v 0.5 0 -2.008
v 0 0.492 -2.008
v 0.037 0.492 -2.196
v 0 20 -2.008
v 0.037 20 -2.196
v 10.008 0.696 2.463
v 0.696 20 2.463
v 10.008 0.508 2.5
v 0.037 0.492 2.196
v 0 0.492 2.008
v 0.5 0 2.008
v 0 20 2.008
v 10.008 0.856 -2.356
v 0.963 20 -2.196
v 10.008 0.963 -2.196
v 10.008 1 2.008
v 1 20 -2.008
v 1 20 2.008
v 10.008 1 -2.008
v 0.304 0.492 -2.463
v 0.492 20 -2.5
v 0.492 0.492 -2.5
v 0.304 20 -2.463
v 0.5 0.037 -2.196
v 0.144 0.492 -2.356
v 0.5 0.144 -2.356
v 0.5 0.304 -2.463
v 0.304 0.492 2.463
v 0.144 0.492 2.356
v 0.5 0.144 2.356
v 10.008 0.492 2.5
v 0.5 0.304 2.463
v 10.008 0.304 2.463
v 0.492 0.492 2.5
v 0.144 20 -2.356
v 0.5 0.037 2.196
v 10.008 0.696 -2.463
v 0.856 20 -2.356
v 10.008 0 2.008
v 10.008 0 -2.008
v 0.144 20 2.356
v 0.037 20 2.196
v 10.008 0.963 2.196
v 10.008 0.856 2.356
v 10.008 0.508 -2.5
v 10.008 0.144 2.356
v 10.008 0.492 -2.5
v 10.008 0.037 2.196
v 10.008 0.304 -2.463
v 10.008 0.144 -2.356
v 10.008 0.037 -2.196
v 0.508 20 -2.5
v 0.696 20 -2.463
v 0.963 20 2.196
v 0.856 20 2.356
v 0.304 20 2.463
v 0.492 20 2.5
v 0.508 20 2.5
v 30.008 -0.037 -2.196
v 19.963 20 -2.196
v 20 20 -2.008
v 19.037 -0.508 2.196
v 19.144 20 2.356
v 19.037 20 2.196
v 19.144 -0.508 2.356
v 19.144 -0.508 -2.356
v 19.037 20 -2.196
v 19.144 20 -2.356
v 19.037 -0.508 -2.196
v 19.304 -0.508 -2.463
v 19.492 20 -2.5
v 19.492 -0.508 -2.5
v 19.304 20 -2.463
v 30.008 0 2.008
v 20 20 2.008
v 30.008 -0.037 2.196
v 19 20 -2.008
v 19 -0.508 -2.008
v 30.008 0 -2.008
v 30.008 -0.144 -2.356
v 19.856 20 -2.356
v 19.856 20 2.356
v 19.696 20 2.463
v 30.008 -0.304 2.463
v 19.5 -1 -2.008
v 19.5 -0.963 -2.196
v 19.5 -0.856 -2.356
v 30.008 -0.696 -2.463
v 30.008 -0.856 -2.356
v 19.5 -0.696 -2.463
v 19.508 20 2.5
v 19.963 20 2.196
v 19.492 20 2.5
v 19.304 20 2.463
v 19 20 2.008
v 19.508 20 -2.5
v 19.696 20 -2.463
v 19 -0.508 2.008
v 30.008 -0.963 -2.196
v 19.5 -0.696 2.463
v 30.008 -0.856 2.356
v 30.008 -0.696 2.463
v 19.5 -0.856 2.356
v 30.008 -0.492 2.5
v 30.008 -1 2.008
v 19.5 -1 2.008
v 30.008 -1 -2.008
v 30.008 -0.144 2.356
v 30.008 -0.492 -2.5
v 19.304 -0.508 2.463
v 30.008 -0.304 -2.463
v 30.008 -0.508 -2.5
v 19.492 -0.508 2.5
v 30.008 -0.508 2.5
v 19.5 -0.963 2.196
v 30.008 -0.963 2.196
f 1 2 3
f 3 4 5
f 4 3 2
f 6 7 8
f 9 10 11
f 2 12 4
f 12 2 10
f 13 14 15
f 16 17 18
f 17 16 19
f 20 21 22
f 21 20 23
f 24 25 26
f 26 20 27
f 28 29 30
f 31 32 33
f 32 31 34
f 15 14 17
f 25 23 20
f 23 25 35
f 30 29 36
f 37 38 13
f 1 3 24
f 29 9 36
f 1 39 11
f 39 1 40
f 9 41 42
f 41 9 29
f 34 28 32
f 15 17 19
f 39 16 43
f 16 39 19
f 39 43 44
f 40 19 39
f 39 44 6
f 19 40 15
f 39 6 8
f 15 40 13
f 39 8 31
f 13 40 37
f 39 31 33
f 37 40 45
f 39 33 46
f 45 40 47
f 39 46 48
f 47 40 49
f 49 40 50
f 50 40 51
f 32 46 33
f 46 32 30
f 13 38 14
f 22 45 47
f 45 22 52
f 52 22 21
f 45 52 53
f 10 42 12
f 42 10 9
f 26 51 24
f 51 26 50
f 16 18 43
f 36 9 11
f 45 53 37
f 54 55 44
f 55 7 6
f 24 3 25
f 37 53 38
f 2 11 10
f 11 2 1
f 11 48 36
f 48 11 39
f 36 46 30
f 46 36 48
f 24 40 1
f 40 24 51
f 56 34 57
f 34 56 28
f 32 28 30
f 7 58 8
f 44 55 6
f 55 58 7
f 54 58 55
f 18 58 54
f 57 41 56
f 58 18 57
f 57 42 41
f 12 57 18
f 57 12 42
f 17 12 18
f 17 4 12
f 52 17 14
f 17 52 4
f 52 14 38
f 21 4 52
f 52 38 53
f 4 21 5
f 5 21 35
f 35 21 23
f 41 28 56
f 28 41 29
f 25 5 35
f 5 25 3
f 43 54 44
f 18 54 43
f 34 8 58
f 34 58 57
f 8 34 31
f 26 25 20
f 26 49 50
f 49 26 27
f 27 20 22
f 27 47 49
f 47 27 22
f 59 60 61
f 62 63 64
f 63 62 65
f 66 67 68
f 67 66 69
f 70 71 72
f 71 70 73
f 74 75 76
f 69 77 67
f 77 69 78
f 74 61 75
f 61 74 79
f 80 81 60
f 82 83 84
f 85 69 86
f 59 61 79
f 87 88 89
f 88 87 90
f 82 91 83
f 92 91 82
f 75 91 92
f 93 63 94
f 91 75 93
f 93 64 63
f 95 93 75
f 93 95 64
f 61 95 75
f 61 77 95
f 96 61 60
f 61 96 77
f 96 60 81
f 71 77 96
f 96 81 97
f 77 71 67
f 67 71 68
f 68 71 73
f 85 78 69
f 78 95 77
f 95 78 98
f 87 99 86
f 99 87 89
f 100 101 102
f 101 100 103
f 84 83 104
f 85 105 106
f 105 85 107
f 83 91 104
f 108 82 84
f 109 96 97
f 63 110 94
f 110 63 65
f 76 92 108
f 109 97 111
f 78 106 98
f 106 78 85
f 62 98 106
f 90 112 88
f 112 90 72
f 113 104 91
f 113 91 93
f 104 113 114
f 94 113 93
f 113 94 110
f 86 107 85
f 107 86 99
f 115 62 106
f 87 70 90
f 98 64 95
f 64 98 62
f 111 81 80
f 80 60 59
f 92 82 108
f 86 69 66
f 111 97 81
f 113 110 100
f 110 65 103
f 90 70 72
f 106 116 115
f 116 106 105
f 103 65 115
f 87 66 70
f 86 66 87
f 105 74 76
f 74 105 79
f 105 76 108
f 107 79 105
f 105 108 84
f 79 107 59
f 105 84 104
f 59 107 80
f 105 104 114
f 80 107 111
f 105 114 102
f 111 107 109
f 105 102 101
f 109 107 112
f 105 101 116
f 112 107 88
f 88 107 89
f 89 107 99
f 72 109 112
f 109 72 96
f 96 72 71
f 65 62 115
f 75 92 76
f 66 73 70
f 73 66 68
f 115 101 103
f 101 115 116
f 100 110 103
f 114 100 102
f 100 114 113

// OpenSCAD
// file: ../utils/core/clip.scad
//
// NopSCADlib Copyright Chris Palmer 2018
// nop.head@gmail.com
// hydraraptor.blogspot.com
//
// This file is part of NopSCADlib.
//
// NopSCADlib is free software: you can redistribute it and/or modify it under the terms of the
// GNU General Public License as published by the Free Software Foundation, either version 3 of
// the License, or (at your option) any later version.
//
// NopSCADlib is distributed in the hope that it will be useful, but WITHOUT ANY WARRANTY;
// without even the implied warranty of MERCHANTABILITY or FITNESS FOR A PARTICULAR PURPOSE.
// See the GNU General Public License for more details.
//
// You should have received a copy of the GNU General Public License along with NopSCADlib.
// If not, see <https://www.gnu.org/licenses/>.
//

//
//! Construct arbitrarily large box to partition 3D space and clip objects, useful for creating cross sections to see the inside when debugging.
//!
//! Original version by Doug Moen on the OpenSCAD forum
//
//
module box(xmin, ymin, zmin, xmax, ymax, zmax) //! Construct a box given its bounds
    polyhedron(
        [[xmin, ymin, zmin],  // 0
         [xmin, ymin, zmax],  // 1
         [xmin, ymax, zmin],  // 2
         [xmin, ymax, zmax],  // 3
         [xmax, ymin, zmin],  // 4
         [xmax, ymin, zmax],  // 5
         [xmax, ymax, zmin],  // 6
         [xmax, ymax, zmax]], // 7
        [[7,5,1,3],  // top
         [2,0,4,6],  // bottom
         [5,4,0,1],  // front
         [3,2,6,7],  // back
         [5,7,6,4],  // right
         [0,2,3,1]]  // left
    );

module clip(xmin = -inf, ymin = -inf, zmin = -inf, xmax = inf, ymax = inf, zmax = inf) //! Clip child to specified boundaries
    render() intersection() {
        children();

        box(xmin, ymin, zmin, xmax, ymax, zmax);
    }
// file: ../utils/core/rounded_rectangle.scad
//
// NopSCADlib Copyright Chris Palmer 2018
// nop.head@gmail.com
// hydraraptor.blogspot.com
//
// This file is part of NopSCADlib.
//
// NopSCADlib is free software: you can redistribute it and/or modify it under the terms of the
// GNU General Public License as published by the Free Software Foundation, either version 3 of
// the License, or (at your option) any later version.
//
// NopSCADlib is distributed in the hope that it will be useful, but WITHOUT ANY WARRANTY;
// without even the implied warranty of MERCHANTABILITY or FITNESS FOR A PARTICULAR PURPOSE.
// See the GNU General Public License for more details.
//
// You should have received a copy of the GNU General Public License along with NopSCADlib.
// If not, see <https://www.gnu.org/licenses/>.
//

//
//! Rectangle with rounded corners.
//
module rounded_square(size, r, center = true) //! Like `square()` but with with rounded corners
{
    assert(r < min(size.x, size.y) / 2);
    $fn = r2sides4n(r);
    offset(r) offset(-r) square(size, center = center);
}

module rounded_rectangle(size, r, center = false, xy_center = true) //! Like `cube()` but corners rounded in XY plane and separate centre options for xy and z.
{
    extrude_if(size.z, center = center)
        rounded_square([size.x, size.y], r, xy_center);
}

module rounded_cube_xy(size, r = 0, xy_center = false, z_center = false) //! Like `cube()` but corners rounded in XY plane and separate centre options for xy and z.
{
    extrude_if(size.z, center = z_center)
        rounded_square([size.x, size.y], r, xy_center);
}

module rounded_cube_xz(size, r = 0, xy_center = false, z_center = false) //! Like `cube()` but corners rounded in XZ plane and separate centre options for xy and z.
{
    translate([xy_center ? 0 : size.x / 2, xy_center ? 0 : size.y / 2, z_center ? 0 : size.z / 2])
        rotate([90, 0, 0])
            rounded_cube_xy([size.x, size.z, size.y], r, xy_center = true, z_center = true);
}

module rounded_cube_yz(size, r = 0, xy_center = false, z_center = false) //! Like `cube()` but corners rounded in YX plane and separate centre options for xy and z.
{
    translate([xy_center ? 0 : size.x / 2, xy_center ? 0 : size.y / 2, z_center ? 0 : size.z / 2])
        rotate([90, 0, 90])
            rounded_cube_xy([size.y, size.z, size.x], r, xy_center = true, z_center = true);
}
// file: ../utils/core/teardrops.scad
//
// NopSCADlib Copyright Chris Palmer 2018
// nop.head@gmail.com
// hydraraptor.blogspot.com
//
// This file is part of NopSCADlib.
//
// NopSCADlib is free software: you can redistribute it and/or modify it under the terms of the
// GNU General Public License as published by the Free Software Foundation, either version 3 of
// the License, or (at your option) any later version.
//
// NopSCADlib is distributed in the hope that it will be useful, but WITHOUT ANY WARRANTY;
// without even the implied warranty of MERCHANTABILITY or FITNESS FOR A PARTICULAR PURPOSE.
// See the GNU General Public License for more details.
//
// You should have received a copy of the GNU General Public License along with NopSCADlib.
// If not, see <https://www.gnu.org/licenses/>.
//

//
//! For making horizontal holes that don't need support material.
//! Small holes can get away without it, but they print better with truncated teardrops.
//!
//! Using teardrop_plus() or setting the plus option on other modules will elongate the teardrop vertically by the layer height, so when sliced the staircase tips
//! do not intrude into the circle. See <https://hydraraptor.blogspot.com/2020/07/horiholes-2.html>
//
module teardrop(h, r, center = true, truncate = true, chamfer = 0, chamfer_both_ends = true, plus = false) { //! For making horizontal holes that don't need support material, set `truncate = false` to make traditional RepRap teardrops that don't even need bridging
    module teardrop_2d(r, truncate) {
        er = layer_height / 2 - eps;    // Extrusion edge radius
        R = plus ? r + er : r;          // Corrected radius
        offset = plus ? -er : 0;        // Offset inwards
        hull()
            for(side = [0 : 1])
                mirror([side, 0, 0])
                    intersection() {
                        hull()
                        translate([offset, 0]) {
                            circle4n(R);

                            if(truncate)
                                translate([0, R / 2])
                                    square([2 * R * (sqrt(2) - 1), R], center = true);
                            else
                                polygon([[0, 0], [eps, 0], [0, R * sqrt(2)]]);
                        }
                        translate([0, -2 * R])
                            square([R, 4 * R]);
                    }
    }

    render(convexity = 5)
        extrude_if(h, center)
            teardrop_2d(r, truncate);

    teardrop_chamfer(h, center, chamfer, chamfer_both_ends) {
        linear_extrude(eps, center = true)
            teardrop_2d(r + chamfer / 2, truncate);

        translate_z(-chamfer / 2)
            linear_extrude(eps, center = true)
                teardrop_2d(r, truncate);
    }
}

module semi_teardrop(h, r, d = undef, center = true, chamfer = 0, chamfer_both_ends = true, plus = false) { //! A semi teardrop in the positive Y domain
    module semi_teardrop_2d(r, d)
        intersection() {
            R = is_undef(d) ? r : d / 2;
            teardrop(r = R, h = 0, plus = plus);

            sq = R + 1;
            translate([-sq, 0])
                square([2 * sq, sq]);
        }

    render(convexity = 5)
        extrude_if(h, center)
            semi_teardrop_2d(r, d);

    teardrop_chamfer(h, center, chamfer, chamfer_both_ends) {
        linear_extrude(eps, center = true)
            semi_teardrop_2d(r + chamfer / 2, d);

        translate_z(-chamfer / 2)
            linear_extrude(eps, center = true)
                semi_teardrop_2d(r, d);
    }
}

module teardrop_plus(h, r, center = true, truncate = true, chamfer = 0, chamfer_both_ends = true) //! Slightly elongated teardrop to allow for the 3D printing staircase effect
    teardrop(h, r, center, truncate, chamfer, chamfer_both_ends, plus = true);

module tearslot(h, r, w, center = true, chamfer = 0, chamfer_both_ends = true, plus = false) { //! A horizontal slot that doesn't need support material
    module tearslot_2d(r, w)
        hull()
            for(x = [-1, 1])
                translate([x * w / 2, 0]) teardrop(r = r, h = 0, plus = plus);

    extrude_if(h, center)
        tearslot_2d(r, w);

    teardrop_chamfer(h, center, chamfer, chamfer_both_ends) {
        linear_extrude(eps, center = true)
            tearslot_2d(r + chamfer / 2, w);

        translate_z(-chamfer / 2)
            linear_extrude(eps, center = true)
                tearslot_2d(r, w);
    }
}

module vertical_tearslot(h, r, l, center = true, chamfer = 0, chamfer_both_ends = true, plus = false) { //! A vertical slot that doesn't need support material
    module vertical_tearslot_2d(r, l)
        hull()
            for(y = [-1, 1])
                translate([0,  y * l / 2])
                    teardrop(0, r, true, plus = plus);

    extrude_if(h, center)
        vertical_tearslot_2d(r, l);

    teardrop_chamfer(h, center, chamfer, chamfer_both_ends) {
        linear_extrude(eps, center = true)
            vertical_tearslot_2d(r + chamfer / 2, l);

        translate_z(-chamfer / 2)
            linear_extrude(eps, center = true)
                vertical_tearslot_2d(r, l);
    }
}

module teardrop_chamfer(h, center, chamfer, chamfer_both_ends) { //! Helper module for adding chamfer to a teardrop
    if(h && chamfer)
        translate_z(center ? 0 : h / 2)
            for(m = chamfer_both_ends ? [0, 1] : [1])
                mirror([0, 0, m])
                    translate_z((h - eps ) / 2)
                        hull()
                            children();
}
// file: ../utils/core/polyholes.scad
//
// NopSCADlib Copyright Chris Palmer 2018
// nop.head@gmail.com
// hydraraptor.blogspot.com
//
// This file is part of NopSCADlib.
//
// NopSCADlib is free software: you can redistribute it and/or modify it under the terms of the
// GNU General Public License as published by the Free Software Foundation, either version 3 of
// the License, or (at your option) any later version.
//
// NopSCADlib is distributed in the hope that it will be useful, but WITHOUT ANY WARRANTY;
// without even the implied warranty of MERCHANTABILITY or FITNESS FOR A PARTICULAR PURPOSE.
// See the GNU General Public License for more details.
//
// You should have received a copy of the GNU General Public License along with NopSCADlib.
// If not, see <https://www.gnu.org/licenses/>.
//

//
//! A method of making 3D printed holes come out the right size regardless of the printer, providing
//! it gets the linear dimensions right. See <https://hydraraptor.blogspot.com/2011/02/polyholes.html>
//!
//! The module provides `poly_circle()`, `poly_cylinder()` and `poly_ring()` that is useful for making printed washers and pillars.
//!
//! `poly_cylinder()` has a `twist` parameter which can be set to make the polygon rotate each layer.
//! This can be used to mitigate the number of sides being small and make small holes stronger and more round, but is quite slow due to the
//! large increase in the number of facets.
//! When set to 1 the polygons alternate each layer, when set higher the rotation takes `twist + 1` layers to repeat.
//! A small additional rotation is added to make the polygon rotate one more side over the length of the hole to make it appear round when
//! viewed end on.
//!
//! When `twist` is set the resulting cylinder is extended by `eps` at each end so that the exact length of the hole can be used without
//! leaving a scar on either surface.
//
function sides(r, n = undef) = is_undef(n) ? max(round(4 * r), 3) : n ? max(n, 3) : r2sides(r); //! Optimum number of sides for specified radius
function corrected_radius(r, n = undef)   = r / cos(180 / sides(r, n));                         //! Adjusted radius to make flats lie on the circle
function corrected_diameter(d, n = undef) = 2 * corrected_radius(d / 2 , n);                    //! Adjusted diameter to make flats lie on the circle

module poly_circle(r, sides = undef) { //! Make a circle adjusted to print the correct size
    n = sides(r, sides);
    circle(r = corrected_radius(r, n), $fn = n);
}

module poly_cylinder(r, h, center = false, sides = undef, chamfer = false, twist = 0) {//! Make a cylinder adjusted to print the correct size
    if(twist) {
        slices = ceil(h / layer_height);
        twists = min(twist + 1, slices);
        sides = sides(r, sides);
        rot = 360 / sides / twists * (twists < slices ? (1 + 1 / slices) : 1);
        if(center)
            for(side = [0, 1])
                mirror([0, 0, side])
                    poly_cylinder(r = r, h = h / 2, sides = sides, twist = twist);
        else
            render(convexity = 5)
                for(i = [0 : slices - 1])
                    translate_z(i * layer_height - eps)
                        rotate(rot * i)
                            poly_cylinder(r = r, h = layer_height + 2 * eps, sides = sides);
    }
    else
        extrude_if(h, center)
            poly_circle(r, sides);

    if(h && chamfer)
        poly_cylinder(r + layer_height, center ? layer_height * 2 : layer_height, center, sides = sides(r, sides));
}

module poly_ring(or, ir, sides = undef) { //! Make a 2D ring adjusted to have the correct internal radius
    cir = corrected_radius(ir, sides);
    filaments = (or - cir) / extrusion_width;
    if(filaments > 3 + eps)
        difference() {
            circle(or);

            poly_circle(ir, sides);
        }
    else
        if(filaments >= 2)
            difference() {
                offset(or - cir)
                    poly_circle(ir, sides);

                poly_circle(ir, sides);
            }
            else
                difference() {
                    poly_circle(or, sides);

                    offset(-squeezed_wall)
                        poly_circle(or, sides);
                }
}

module poly_tube(or, ir, h, center = false) //! Make a tube adjusted to have the correct internal radius
    extrude_if(h, center)
        poly_ring(or, ir);

module drill(r, h = 100, center = true) //! Make a cylinder for drilling holes suitable for CNC routing, set h = 0 for circle
    extrude_if(h, center)
        circle(r = corrected_radius(r, r2sides(r)));

module poly_drill(r, h = 100, center = true) //! Make a cylinder for drilling holes suitable for CNC routing if cnc_bit_r is non zero, otherwise a poly_cylinder.
    if(cnc_bit_r)
        drill(r, h, center = true);
    else
        poly_cylinder(r, h, center);

//
// Horizontal slot
//
module slot(r, l, h = 100) //! Make a horizontal slot suitable for CNC routing, set h = 0 for 2D version
    extrude_if(h)
        hull() {
            translate([l / 2,0])
                drill(r, 0);

            translate([-l / 2,0])
                drill(r, 0);
        }
// file: ../utils/core/sphere.scad
//
// NopSCADlib Copyright Chris Palmer 2018
// nop.head@gmail.com
// hydraraptor.blogspot.com
//
// This file is part of NopSCADlib.
//
// NopSCADlib is free software: you can redistribute it and/or modify it under the terms of the
// GNU General Public License as published by the Free Software Foundation, either version 3 of
// the License, or (at your option) any later version.
//
// NopSCADlib is distributed in the hope that it will be useful, but WITHOUT ANY WARRANTY;
// without even the implied warranty of MERCHANTABILITY or FITNESS FOR A PARTICULAR PURPOSE.
// See the GNU General Public License for more details.
//
// You should have received a copy of the GNU General Public License along with NopSCADlib.
// If not, see <https://www.gnu.org/licenses/>.
//

//! Redefines `sphere()` to always have a vertex on all six half axes I.e. vertices at the poles and the equator and `$fn` a multiple of four.
//! This ensures `hull` and `minkowski` results have the correct dimensions when spheres are placed at the corners.

module sphere(r = 1, d = undef) {                   //! Override `sphere` so that has vertices on all three axes. Has the advantage of giving correct dimensions when hulled
    R = is_undef(d) ? r : d / 2;
    rotate_extrude($fn = r2sides4n(R))
        rotate(-90)
            semi_circle(R);
}
// file: ../utils/core/global.scad
//
// NopSCADlib Copyright Chris Palmer 2018
// nop.head@gmail.com
// hydraraptor.blogspot.com
//
// This file is part of NopSCADlib.
//
// NopSCADlib is free software: you can redistribute it and/or modify it under the terms of the
// GNU General Public License as published by the Free Software Foundation, either version 3 of
// the License, or (at your option) any later version.
//
// NopSCADlib is distributed in the hope that it will be useful, but WITHOUT ANY WARRANTY;
// without even the implied warranty of MERCHANTABILITY or FITNESS FOR A PARTICULAR PURPOSE.
// See the GNU General Public License for more details.
//
// You should have received a copy of the GNU General Public License along with NopSCADlib.
// If not, see <https://www.gnu.org/licenses/>.
//

//
//! Global constants, functions and modules. This file is used directly or indirectly in every scad file.
//
include <../../global_defs.scad>

function inch(x) = x * 25.4;                                                        //! Inch to mm conversion (For fractional inches, 'inch(1 + 7/8)' will work as expected.)
function foot(x) = x * 25.4 * 12;                                                   //! Foot to mm conversion
function yard(x) = x * 25.4 * 12 * 3;                                               //! Yard to mm conversion
function mm(x)   = x;                                                               //! Explicit mm specified
function cm(x)   = x * 10.0;                                                        //! cm to mm conversion
function m(x)    = x * 1000.0;                                                      //! m to mm conversion

function sqr(x) = x * x;                                                            //! Returns the square of `x`
function echoit(x) = echo(x) x;                                                     //! Echo expression and return it, useful for debugging
function no_point(str) = chr([for(c = str(str)) if(c == ".") ord("p") else ord(c)]);//! Replace decimal point in string with 'p'
function in(list, x) = !!len([for(v = list) if(v == x) true]);                      //! Returns true if `x` is an element in the `list`
function Len(x) = is_list(x) ? len(x) : 0;                                          //! Returns the length of a list or 0 if `x` is not a list
function r2sides(r) = $fn ? $fn : ceil(max(min(360/ $fa, r * 2 * PI / $fs), 5));    //! Replicates the OpenSCAD logic to calculate the number of sides from the radius
function r2sides4n(r) = floor((r2sides(r) + 3) / 4) * 4;                            //! Round up the number of sides to a multiple of 4 to ensure points land on all axes
function limit(x, min, max) = max(min(x, max), min);                                //! Force x in range min <= x <= max

module translate_z(z) translate([0, 0, z]) children();                              //! Shortcut for Z only translations
module vflip(flip=true) rotate([flip ? 180 : 0, 0, 0]) children();                  //! Invert children by doing a 180&deg; flip around the X axis
module hflip(flip=true) rotate([0, flip ? 180: 0, 0]) children();                   //! Invert children by doing a 180&deg; flip around the Y axis
module ellipse(xr, yr) scale([1, yr / xr]) circle4n(xr);                            //! Draw an ellipse

function slice_str(str, start, end, s ="") = start >= end ? s : slice_str(str, start + 1, end, str(s, str[start])); // Helper for slice()

function slice(list, start = 0, end = undef) = let( //! Slice a list or string with Python type semantics
        len = len(list),
        start = limit(start < 0 ? len + start : start, 0, len),
        end   = is_undef(end) ? len : limit(end   < 0 ? len + end : end, 0, len)
    ) is_string(list) ? slice_str(list, start, end) : [for(i = [start : 1 : end - 1]) list[i]];


module render_if(render = true, convexity = 2)      //! Renders an object if `render` is true, otherwise leaves it unrendered
    if (render)
        render(convexity = convexity)
            children();
    else
        children();

module extrude_if(h, center = true)                 //! Extrudes 2D object to 3D when `h` is nonzero, otherwise leaves it 2D
    if(h)
        linear_extrude(h, center = center, convexity = 2) // 3D
            children();
    else
        children();                                 // 2D

module circle4n(r, d = undef) {                     //! Circle with multiple of 4 vertices
    R = is_undef(d) ? r : d / 2;
    circle(R, $fn = r2sides4n(R));
}

module semi_circle(r, d = undef)                    //! A semi circle in the positive Y domain
    intersection() {
        R = is_undef(d) ? r : d / 2;
        circle4n(R);

        sq = R + 1;
        translate([-sq, 0])
            square([2 * sq, sq]);
    }

module right_triangle(width, height, h, center = true) //! A right angled triangle with the 90&deg; corner at the origin. 3D when `h` is nonzero, otherwise 2D
    extrude_if(h, center = center)
        polygon(points = [[0,0], [width, 0], [0, height]]);

include <sphere.scad>
include <bom.scad>
include <polyholes.scad>
include <teardrops.scad>
include <rounded_rectangle.scad>
include <clip.scad>
// file: ../utils/core/core.scad
//
// NopSCADlib Copyright Chris Palmer 2018
// nop.head@gmail.com
// hydraraptor.blogspot.com
//
// This file is part of NopSCADlib.
//
// NopSCADlib is free software: you can redistribute it and/or modify it under the terms of the
// GNU General Public License as published by the Free Software Foundation, either version 3 of
// the License, or (at your option) any later version.
//
// NopSCADlib is distributed in the hope that it will be useful, but WITHOUT ANY WARRANTY;
// without even the implied warranty of MERCHANTABILITY or FITNESS FOR A PARTICULAR PURPOSE.
// See the GNU General Public License for more details.
//
// You should have received a copy of the GNU General Public License along with NopSCADlib.
// If not, see <https://www.gnu.org/licenses/>.
//

//
// Include this file to use the minimum library
//
include <../../global_defs.scad>
//
// Global functions and modules
//
use <global.scad>

module use_stl(name) {               //! Import an STL to make a build platter
    stl(name);
    path = is_undef($target) ? "../stls/" : str($cwd, "/", $target, "/stls/");
    import(str(path, name, ".stl"));
}

module use_dxf(name) {               //! Import a DXF to make a build panel
    dxf(name);
    path = is_undef($target) ? "../dxfs/" : str($cwd, "/", $target, "/dxfs/");
    import(str(path, name, ".dxf"));
}
// file: ../utils/rounded_triangle.scad
//
// NopSCADlib Copyright Chris Palmer 2018
// nop.head@gmail.com
// hydraraptor.blogspot.com
//
// This file is part of NopSCADlib.
//
// NopSCADlib is free software: you can redistribute it and/or modify it under the terms of the
// GNU General Public License as published by the Free Software Foundation, either version 3 of
// the License, or (at your option) any later version.
//
// NopSCADlib is distributed in the hope that it will be useful, but WITHOUT ANY WARRANTY;
// without even the implied warranty of MERCHANTABILITY or FITNESS FOR A PARTICULAR PURPOSE.
// See the GNU General Public License for more details.
//
// You should have received a copy of the GNU General Public License along with NopSCADlib.
// If not, see <https://www.gnu.org/licenses/>.
//

//
//! Draw a 3D right triangle with rounded edges. Intended to be embedded in other parts. Can be optionally offset by the filleted amount.
//
include <../utils/core/core.scad>

module rounded_right_triangle(x, y, z, fillet, center = true, offset = false) { //! Draw a 3D right triangle with rounded edges.
    fillet = max(fillet, eps);
    size = [x + (offset ? 2 * fillet : 0), y + (offset ? 2 * fillet : 0), z];

    translate([offset ? -2 * fillet : 0, offset ? -2 * fillet : 0, center ? 0 : size.z / 2])
        hull() {
            translate([0, fillet, size.z / 2])
                rotate([90, 90, 0])
                    rounded_rectangle([size.z, 2 * fillet, eps], fillet - eps, xy_center = false);
            translate([0, size.y, size.z / 2])
                rotate([90, 90, 0])
                    rounded_rectangle([size.z, 2 * fillet, eps], fillet - eps, xy_center = false);
            translate([fillet, 0, size.z / 2])
                rotate([0, 90, 0])
                    rounded_rectangle([size.z, 2 * fillet, eps], fillet - eps, xy_center = false);
            translate([size.x, 0, size.z / 2])
                rotate([0, 90, 0])
                    rounded_rectangle([size.z, 2 * fillet, eps], fillet - eps, xy_center = false);
        }
}
// file: ../global_defs.scad
//
// NopSCADlib Copyright Chris Palmer 2018
// nop.head@gmail.com
// hydraraptor.blogspot.com
//
// This file is part of NopSCADlib.
//
// NopSCADlib is free software: you can redistribute it and/or modify it under the terms of the
// GNU General Public License as published by the Free Software Foundation, either version 3 of
// the License, or (at your option) any later version.
//
// NopSCADlib is distributed in the hope that it will be useful, but WITHOUT ANY WARRANTY;
// without even the implied warranty of MERCHANTABILITY or FITNESS FOR A PARTICULAR PURPOSE.
// See the GNU General Public License for more details.
//
// You should have received a copy of the GNU General Public License along with NopSCADlib.
// If not, see <https://www.gnu.org/licenses/>.
//

//
// This file included directly or indirectly in every scad file.
//
// This scheme allows the following:
//  bom defaults to 0
//  Setting $bom on the command line or in the main file before including lib.scad overrides it everywhere.
//  Setting $bom after including lib overrides bom in the libs but not in the local file.
//  Setting $_bom in the local file overrides it in the local file but not in the libs.
//
rr_green = [0, 146/255, 0];                                               // RepRap logo colour
crimson  = [220/255, 20/255, 60/255];

$_bom           = is_undef($bom)             ? 0      : $bom;             // 0 no bom, 1 assemblies and stls, 2 vitamins as well
$exploded       = is_undef($explode)         ? 0      : $explode;         // 1 for exploded view
layer_height    = is_undef($layer_height)    ? 0.25   : $layer_height;    // layer height when printing
extrusion_width = is_undef($extrusion_width) ? 0.5    : $extrusion_width; // filament width when printing
nozzle          = is_undef($nozzle)          ? 0.45   : $nozzle;          // 3D printer nozzle
cnc_bit_r       = is_undef($cnc_bit_r)       ? 1.2    : $cnc_bit_r;       // minimum tool radius when milling 2D objects
pp1_colour      = is_undef($pp1_colour)      ? rr_green : $pp1_colour;    // printed part colour 1, RepRap logo colour
pp2_colour      = is_undef($pp2_colour)      ? crimson : $pp2_colour;     // printed part colour 2
pp3_colour      = is_undef($pp3_colour)      ? "SteelBlue" : $pp3_colour; // printed part colour 3
pp4_colour      = is_undef($pp4_colour)      ? "darkorange" : $pp4_colour;// printed part colour 4
show_rays       = is_undef($show_rays)       ? false  : $show_rays;       // show camera sight lines and light direction
show_threads    = is_undef($show_threads)    ? false  : $show_threads;    // show screw threads

// Minimum wall is about two filaments wide but we extrude it closer to get better bonding
squeezed_wall = $preview ? 2 * extrusion_width - layer_height * (1 - PI / 4)
                         : extrusion_width - layer_height / 2 + nozzle / 2 + extrusion_width / 2;

inf = 1e10;      // very big
eps = 1/128;     // small fudge factor to stop CSG barfing on coincident faces.
$fa = 6;
$fs = extrusion_width / 2;

function round_to_layer(z) = ceil(z / layer_height) * layer_height;
// Some additional named colours
function grey(n) = [0.01, 0.01, 0.01] * n;                                          //! Generate a shade of grey to pass to color().
silver                          = [0.75, 0.75, 0.75];
gold                            = [255, 215,   0] / 255;
brass                           = [255, 220, 100] / 255;
copper                          = [230, 140,  51] / 255;

/*
 * Enums
 */
//
// Screws
//
hs_cap    = 0;
hs_pan    = 1;
hs_cs     = 2;     // counter sunk
hs_hex    = 3;
hs_grub   = 4;     // pulley set screw
hs_cs_cap = 5;
hs_dome   = 6;
//
// Hot end descriptions
//
jhead   = 1;
e3d     = 2;
//
// Face enumeration
//
f_bottom = 0;
f_top    = 1;
f_left   = 2;
f_right  = 3;
f_front  = 4;
f_back   = 5;
// main file
//
// NopSCADlib Copyright Chris Palmer 2018
// nop.head@gmail.com
// hydraraptor.blogspot.com
//
// This file is part of NopSCADlib.
//
// NopSCADlib is free software: you can redistribute it and/or modify it under the terms of the
// GNU General Public License as published by the Free Software Foundation, either version 3 of
// the License, or (at your option) any later version.
//
// NopSCADlib is distributed in the hope that it will be useful, but WITHOUT ANY WARRANTY;
// without even the implied warranty of MERCHANTABILITY or FITNESS FOR A PARTICULAR PURPOSE.
// See the GNU General Public License for more details.
//
// You should have received a copy of the GNU General Public License along with NopSCADlib.
// If not, see <https://www.gnu.org/licenses/>.
//

include <../global_defs.scad>
use <../utils/rounded_triangle.scad>


module rounded_right_triangles() {
    rounded_right_triangle(10, 20, 5, 0.5);

    translate([20, 0])
        rounded_right_triangle(10, 20, 5, 0.5, offset = true);
}

rounded_right_triangles();
